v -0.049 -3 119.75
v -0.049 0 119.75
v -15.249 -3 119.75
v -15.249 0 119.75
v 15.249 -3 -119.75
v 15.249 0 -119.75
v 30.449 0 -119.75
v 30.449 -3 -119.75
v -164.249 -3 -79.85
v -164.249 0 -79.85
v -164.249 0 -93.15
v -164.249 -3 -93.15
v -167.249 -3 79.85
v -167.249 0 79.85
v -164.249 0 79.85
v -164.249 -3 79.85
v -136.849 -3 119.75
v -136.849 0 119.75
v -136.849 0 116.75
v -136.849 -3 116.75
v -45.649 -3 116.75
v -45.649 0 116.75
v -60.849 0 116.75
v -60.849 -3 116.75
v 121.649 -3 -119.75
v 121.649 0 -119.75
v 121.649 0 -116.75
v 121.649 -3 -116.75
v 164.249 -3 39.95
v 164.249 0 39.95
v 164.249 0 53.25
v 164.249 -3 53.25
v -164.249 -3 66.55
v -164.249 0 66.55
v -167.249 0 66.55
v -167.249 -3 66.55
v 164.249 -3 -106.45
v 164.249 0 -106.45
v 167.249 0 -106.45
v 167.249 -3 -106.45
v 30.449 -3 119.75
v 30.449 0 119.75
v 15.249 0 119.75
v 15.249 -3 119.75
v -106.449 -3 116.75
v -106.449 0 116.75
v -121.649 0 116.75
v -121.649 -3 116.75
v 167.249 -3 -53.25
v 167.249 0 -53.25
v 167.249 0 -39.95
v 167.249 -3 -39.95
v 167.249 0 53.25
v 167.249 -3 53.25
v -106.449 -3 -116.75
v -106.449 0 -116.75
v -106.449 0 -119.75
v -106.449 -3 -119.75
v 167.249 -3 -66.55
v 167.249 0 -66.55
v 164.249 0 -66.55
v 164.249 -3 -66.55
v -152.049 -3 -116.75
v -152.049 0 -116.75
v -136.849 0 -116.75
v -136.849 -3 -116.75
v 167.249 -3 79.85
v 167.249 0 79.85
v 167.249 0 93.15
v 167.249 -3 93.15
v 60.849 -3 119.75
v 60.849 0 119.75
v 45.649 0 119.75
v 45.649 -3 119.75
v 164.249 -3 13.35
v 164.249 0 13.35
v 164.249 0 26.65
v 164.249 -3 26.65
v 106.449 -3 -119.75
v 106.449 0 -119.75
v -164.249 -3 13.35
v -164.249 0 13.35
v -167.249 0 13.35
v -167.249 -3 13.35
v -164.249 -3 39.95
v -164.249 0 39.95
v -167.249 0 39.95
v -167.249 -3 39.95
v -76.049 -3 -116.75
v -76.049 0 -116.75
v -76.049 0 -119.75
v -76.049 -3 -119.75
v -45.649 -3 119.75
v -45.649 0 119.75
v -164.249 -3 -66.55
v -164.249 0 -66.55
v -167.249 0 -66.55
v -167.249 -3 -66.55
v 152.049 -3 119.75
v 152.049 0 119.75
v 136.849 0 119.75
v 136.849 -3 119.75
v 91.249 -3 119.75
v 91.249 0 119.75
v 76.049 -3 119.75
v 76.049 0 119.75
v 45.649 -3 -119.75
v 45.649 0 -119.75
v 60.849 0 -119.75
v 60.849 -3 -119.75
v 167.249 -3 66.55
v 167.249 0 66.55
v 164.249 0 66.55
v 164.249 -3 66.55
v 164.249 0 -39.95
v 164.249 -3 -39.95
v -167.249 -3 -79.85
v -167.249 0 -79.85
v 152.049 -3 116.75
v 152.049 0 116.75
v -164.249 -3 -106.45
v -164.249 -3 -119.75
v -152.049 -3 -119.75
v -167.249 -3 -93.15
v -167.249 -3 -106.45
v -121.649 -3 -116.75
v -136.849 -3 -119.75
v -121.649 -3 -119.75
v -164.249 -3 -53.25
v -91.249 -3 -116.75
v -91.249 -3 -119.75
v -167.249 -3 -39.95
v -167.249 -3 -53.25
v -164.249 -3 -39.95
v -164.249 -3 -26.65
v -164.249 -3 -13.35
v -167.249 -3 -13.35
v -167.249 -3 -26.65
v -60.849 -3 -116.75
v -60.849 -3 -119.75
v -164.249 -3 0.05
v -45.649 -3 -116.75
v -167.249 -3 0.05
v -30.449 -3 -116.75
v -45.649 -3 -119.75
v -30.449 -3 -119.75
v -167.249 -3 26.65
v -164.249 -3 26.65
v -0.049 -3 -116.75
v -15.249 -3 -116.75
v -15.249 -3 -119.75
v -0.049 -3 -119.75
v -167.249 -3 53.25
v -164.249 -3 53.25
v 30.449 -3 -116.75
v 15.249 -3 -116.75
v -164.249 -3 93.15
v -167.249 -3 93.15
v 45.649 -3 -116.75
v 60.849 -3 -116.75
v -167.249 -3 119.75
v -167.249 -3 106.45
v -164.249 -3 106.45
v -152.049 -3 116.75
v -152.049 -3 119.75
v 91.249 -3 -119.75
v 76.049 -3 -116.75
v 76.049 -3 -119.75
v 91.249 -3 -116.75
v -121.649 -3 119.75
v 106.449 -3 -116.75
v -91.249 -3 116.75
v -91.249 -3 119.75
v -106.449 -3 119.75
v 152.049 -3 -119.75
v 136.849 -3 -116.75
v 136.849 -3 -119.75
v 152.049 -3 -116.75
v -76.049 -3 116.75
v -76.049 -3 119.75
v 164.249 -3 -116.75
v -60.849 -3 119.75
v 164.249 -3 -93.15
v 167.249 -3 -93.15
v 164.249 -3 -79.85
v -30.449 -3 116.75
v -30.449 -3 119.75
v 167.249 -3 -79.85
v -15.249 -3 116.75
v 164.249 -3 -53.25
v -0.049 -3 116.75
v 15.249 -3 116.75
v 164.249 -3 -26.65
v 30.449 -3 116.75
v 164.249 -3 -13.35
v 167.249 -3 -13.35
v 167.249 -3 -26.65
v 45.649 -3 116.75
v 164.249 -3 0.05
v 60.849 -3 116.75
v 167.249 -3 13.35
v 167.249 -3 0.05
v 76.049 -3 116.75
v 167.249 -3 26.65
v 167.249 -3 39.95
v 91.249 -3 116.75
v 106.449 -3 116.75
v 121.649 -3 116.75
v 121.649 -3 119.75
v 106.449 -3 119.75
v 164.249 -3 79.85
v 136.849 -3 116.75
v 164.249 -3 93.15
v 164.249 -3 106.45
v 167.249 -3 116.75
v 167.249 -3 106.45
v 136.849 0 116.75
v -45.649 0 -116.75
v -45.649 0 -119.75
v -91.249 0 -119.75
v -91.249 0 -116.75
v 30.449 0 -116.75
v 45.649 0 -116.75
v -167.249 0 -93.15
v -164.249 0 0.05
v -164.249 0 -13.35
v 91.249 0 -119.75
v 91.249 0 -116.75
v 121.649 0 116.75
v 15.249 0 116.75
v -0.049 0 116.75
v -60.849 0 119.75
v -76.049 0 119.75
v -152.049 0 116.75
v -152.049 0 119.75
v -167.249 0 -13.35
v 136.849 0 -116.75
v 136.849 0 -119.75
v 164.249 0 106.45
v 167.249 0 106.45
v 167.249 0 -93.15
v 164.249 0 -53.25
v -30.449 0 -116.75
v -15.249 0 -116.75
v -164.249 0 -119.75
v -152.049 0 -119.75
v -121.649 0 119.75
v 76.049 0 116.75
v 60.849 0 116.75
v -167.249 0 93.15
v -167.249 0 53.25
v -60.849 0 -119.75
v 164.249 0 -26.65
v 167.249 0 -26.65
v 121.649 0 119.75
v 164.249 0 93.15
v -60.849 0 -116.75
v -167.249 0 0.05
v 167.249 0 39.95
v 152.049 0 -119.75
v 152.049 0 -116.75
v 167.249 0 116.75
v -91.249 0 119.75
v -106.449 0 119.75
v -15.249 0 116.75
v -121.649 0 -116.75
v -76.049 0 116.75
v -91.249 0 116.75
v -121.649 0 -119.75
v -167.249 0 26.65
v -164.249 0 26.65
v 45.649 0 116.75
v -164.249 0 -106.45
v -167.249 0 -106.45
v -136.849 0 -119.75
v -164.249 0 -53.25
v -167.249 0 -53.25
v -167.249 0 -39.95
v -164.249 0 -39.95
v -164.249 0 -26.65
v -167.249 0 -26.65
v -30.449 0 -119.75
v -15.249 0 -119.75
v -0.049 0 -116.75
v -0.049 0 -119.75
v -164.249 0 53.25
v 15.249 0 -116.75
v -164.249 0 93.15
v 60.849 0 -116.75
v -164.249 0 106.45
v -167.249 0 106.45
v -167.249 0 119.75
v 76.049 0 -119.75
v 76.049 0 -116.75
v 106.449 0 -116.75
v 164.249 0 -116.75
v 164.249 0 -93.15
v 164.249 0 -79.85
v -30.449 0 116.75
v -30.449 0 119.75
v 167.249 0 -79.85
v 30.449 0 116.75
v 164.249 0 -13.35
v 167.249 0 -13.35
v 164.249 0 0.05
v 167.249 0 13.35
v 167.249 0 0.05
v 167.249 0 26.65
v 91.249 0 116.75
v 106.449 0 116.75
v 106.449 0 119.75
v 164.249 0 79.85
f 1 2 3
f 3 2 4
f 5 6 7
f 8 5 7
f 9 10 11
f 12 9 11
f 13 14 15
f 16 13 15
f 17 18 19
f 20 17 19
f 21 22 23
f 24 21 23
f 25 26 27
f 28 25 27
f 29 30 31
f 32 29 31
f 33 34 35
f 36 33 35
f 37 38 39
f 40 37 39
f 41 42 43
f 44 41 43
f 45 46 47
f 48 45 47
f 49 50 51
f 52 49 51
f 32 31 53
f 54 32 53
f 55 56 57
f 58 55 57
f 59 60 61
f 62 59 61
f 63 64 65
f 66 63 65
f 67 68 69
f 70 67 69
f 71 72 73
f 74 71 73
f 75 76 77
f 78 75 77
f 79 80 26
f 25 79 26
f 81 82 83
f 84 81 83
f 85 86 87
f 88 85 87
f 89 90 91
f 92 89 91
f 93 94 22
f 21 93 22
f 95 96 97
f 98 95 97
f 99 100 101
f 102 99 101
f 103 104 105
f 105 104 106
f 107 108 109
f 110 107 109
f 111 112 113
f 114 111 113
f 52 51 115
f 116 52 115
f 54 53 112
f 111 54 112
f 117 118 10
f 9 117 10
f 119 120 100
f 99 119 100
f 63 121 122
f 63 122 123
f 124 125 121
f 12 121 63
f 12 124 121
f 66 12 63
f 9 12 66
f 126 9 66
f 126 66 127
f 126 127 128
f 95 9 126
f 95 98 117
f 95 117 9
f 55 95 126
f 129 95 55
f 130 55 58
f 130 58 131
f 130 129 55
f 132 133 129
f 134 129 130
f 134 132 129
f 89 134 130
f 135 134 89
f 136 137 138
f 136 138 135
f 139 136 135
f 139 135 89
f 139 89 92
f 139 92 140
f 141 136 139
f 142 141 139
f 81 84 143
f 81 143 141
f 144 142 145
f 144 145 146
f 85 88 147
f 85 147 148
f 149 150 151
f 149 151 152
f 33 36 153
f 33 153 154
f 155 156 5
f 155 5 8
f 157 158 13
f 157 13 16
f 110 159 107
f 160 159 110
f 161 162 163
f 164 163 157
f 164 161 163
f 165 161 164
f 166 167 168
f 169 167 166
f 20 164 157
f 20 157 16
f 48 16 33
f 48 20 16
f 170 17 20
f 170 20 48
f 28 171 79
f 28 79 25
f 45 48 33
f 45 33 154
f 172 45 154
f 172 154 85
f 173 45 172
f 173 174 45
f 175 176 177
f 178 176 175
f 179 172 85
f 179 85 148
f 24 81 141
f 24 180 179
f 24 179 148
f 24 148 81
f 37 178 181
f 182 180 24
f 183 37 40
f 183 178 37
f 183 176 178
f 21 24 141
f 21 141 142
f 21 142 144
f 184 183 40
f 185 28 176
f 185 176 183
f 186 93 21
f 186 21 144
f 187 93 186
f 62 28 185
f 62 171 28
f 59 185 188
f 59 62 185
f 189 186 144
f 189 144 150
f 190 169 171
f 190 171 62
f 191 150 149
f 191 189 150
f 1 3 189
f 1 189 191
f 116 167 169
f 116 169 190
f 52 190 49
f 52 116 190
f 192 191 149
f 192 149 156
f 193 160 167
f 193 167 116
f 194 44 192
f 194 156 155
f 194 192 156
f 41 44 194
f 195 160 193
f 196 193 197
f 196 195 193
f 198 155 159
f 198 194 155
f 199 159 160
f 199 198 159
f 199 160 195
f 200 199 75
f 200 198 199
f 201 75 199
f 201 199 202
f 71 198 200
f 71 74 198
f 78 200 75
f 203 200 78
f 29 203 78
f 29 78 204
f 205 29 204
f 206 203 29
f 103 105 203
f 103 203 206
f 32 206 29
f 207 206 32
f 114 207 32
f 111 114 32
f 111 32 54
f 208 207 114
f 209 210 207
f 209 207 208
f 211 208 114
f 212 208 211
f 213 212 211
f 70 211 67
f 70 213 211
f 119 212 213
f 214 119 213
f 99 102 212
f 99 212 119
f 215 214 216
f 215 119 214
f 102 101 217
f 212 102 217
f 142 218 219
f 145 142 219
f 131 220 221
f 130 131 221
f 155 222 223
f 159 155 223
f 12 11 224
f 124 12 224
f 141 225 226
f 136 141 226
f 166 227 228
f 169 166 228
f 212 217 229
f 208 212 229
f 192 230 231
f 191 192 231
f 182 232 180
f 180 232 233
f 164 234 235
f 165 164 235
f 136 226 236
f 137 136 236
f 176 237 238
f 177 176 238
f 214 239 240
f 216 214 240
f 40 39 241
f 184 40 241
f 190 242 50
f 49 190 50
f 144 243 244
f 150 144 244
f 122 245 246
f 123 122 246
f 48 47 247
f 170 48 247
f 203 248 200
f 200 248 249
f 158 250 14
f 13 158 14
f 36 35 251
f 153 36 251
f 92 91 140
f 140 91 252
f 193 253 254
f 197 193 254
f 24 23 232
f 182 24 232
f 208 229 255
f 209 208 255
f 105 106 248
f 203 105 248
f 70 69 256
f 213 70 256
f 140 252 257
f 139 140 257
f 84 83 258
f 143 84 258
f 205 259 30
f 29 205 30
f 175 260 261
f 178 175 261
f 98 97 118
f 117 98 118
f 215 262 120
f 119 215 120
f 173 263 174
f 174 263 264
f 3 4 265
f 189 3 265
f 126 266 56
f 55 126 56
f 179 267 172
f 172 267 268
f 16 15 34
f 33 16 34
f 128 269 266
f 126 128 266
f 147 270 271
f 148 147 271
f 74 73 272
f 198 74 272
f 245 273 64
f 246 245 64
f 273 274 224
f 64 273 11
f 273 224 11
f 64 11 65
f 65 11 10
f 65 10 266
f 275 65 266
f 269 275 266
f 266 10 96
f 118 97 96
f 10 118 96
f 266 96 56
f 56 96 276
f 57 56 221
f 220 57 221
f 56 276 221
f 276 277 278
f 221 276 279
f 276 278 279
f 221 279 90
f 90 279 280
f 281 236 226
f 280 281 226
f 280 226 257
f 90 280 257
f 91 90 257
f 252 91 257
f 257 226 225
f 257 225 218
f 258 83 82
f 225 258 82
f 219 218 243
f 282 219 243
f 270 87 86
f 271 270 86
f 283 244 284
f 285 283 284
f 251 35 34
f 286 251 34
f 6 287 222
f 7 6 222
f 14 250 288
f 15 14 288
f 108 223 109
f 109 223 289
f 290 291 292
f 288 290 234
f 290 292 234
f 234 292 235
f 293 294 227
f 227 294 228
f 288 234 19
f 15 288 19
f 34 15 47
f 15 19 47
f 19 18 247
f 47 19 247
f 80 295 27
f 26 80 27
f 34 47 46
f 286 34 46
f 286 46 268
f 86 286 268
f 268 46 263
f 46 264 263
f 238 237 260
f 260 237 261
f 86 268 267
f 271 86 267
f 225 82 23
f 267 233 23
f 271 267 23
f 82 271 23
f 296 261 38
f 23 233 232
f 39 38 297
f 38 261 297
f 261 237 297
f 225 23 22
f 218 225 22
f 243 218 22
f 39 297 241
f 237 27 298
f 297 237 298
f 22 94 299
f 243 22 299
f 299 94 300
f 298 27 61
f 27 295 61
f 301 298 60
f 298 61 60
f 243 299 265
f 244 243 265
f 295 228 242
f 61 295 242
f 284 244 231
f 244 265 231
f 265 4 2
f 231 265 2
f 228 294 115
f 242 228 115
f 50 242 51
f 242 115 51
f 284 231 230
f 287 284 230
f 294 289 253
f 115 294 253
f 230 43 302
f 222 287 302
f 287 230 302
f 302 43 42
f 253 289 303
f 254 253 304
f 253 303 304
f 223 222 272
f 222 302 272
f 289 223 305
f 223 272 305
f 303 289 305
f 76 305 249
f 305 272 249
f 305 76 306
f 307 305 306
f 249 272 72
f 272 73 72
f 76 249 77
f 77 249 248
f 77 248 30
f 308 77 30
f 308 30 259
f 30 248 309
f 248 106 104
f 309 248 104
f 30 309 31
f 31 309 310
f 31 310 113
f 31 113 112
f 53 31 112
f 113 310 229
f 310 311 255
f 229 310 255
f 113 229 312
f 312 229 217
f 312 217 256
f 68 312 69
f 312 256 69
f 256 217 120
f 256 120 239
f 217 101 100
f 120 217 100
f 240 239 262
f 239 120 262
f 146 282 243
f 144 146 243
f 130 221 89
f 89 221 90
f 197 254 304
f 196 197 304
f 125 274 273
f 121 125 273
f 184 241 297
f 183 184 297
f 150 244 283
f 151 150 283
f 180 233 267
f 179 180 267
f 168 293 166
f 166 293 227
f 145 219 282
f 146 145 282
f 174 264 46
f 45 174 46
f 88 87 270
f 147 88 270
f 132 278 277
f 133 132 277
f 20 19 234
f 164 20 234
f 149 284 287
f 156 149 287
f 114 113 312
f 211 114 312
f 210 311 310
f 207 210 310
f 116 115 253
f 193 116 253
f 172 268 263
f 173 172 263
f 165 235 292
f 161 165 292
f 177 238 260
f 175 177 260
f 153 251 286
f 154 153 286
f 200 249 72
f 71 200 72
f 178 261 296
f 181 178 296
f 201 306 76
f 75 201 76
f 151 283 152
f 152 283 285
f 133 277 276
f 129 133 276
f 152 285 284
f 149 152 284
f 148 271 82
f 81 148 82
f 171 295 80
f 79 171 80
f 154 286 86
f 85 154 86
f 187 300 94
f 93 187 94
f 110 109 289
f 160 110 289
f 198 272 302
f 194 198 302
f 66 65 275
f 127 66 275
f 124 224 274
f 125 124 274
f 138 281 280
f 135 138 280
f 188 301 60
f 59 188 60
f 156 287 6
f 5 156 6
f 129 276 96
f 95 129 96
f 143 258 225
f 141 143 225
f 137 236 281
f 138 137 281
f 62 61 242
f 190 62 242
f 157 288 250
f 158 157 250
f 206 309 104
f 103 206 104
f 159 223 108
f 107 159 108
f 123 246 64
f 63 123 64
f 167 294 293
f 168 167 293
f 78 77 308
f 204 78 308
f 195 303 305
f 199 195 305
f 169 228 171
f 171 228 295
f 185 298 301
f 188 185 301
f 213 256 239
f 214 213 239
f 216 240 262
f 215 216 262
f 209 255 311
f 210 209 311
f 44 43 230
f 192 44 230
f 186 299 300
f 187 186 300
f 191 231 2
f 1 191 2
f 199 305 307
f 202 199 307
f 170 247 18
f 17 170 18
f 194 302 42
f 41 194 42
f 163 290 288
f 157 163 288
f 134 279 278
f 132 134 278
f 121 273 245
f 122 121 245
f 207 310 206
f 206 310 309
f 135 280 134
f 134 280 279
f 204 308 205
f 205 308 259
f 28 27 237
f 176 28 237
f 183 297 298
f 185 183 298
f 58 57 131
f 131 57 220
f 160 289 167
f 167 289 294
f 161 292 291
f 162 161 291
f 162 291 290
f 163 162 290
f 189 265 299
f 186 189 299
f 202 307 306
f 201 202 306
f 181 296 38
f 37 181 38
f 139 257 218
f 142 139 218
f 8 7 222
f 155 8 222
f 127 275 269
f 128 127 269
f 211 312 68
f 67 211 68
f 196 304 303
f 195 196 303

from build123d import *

# Parameters (mm, degrees)
F1_DEPTH = 3


with BuildPart() as f1:
    # F0 (on Front) → F1 (new body)
    with BuildSketch(Plane.XZ):
        Polygon((152.04934, 116.75), (152.04934, 119.75), (136.84934, 119.75), (136.84934, 116.75), (121.64934, 116.75), (121.64934, 119.75), (106.44934, 119.75), (106.44934, 116.75), (91.24934, 116.75), (91.24934, 119.75), (76.04934, 119.75), (76.04934, 116.75), (60.84934, 116.75), (60.84934, 119.75), (45.64934, 119.75), (45.64934, 116.75), (30.44934, 116.75), (30.44934, 119.75), (15.24934, 119.75), (15.24934, 116.75), (0.04934, 116.75), (-0.04934, 116.75), (-0.04934, 119.75), (-15.24934, 119.75), (-15.24934, 116.75), (-30.44934, 116.75), (-30.44934, 119.75), (-45.64934, 119.75), (-45.64934, 116.75), (-60.84934, 116.75), (-60.84934, 119.75), (-76.04934, 119.75), (-76.04934, 116.75), (-91.24934, 116.75), (-91.24934, 119.75), (-106.44934, 119.75), (-106.44934, 116.75), (-121.64934, 116.75), (-121.64934, 119.75), (-136.84934, 119.75), (-136.84934, 116.75), (-152.04934, 116.75), (-152.04934, 119.75), (-167.24934, 119.75), (-167.24934, 106.45), (-164.24934, 106.45), (-164.24934, 93.15), (-167.24934, 93.15), (-167.24934, 79.85), (-164.24934, 79.85), (-164.24934, 66.55), (-167.24934, 66.55), (-167.24934, 53.25), (-164.24934, 53.25), (-164.24934, 39.95), (-167.24934, 39.95), (-167.24934, 26.65), (-164.24934, 26.65), (-164.24934, 13.35), (-167.24934, 13.35), (-167.24934, 0.05), (-164.24934, 0.05), (-164.24934, -0.05), (-164.24934, -13.35), (-167.24934, -13.35), (-167.24934, -26.65), (-164.24934, -26.65), (-164.24934, -39.95), (-167.24934, -39.95), (-167.24934, -53.25), (-164.24934, -53.25), (-164.24934, -66.55), (-167.24934, -66.55), (-167.24934, -79.85), (-164.24934, -79.85), (-164.24934, -93.15), (-167.24934, -93.15), (-167.24934, -106.45), (-164.24934, -106.45), (-164.24934, -119.75), (-152.04934, -119.75), (-152.04934, -116.75), (-136.84934, -116.75), (-136.84934, -119.75), (-121.64934, -119.75), (-121.64934, -116.75), (-106.44934, -116.75), (-106.44934, -119.75), (-91.24934, -119.75), (-91.24934, -116.75), (-76.04934, -116.75), (-76.04934, -119.75), (-60.84934, -119.75), (-60.84934, -116.75), (-45.64934, -116.75), (-45.64934, -119.75), (-30.44934, -119.75), (-30.44934, -116.75), (-15.24934, -116.75), (-15.24934, -119.75), (-0.04934, -119.75), (-0.04934, -116.75), (0.04934, -116.75), (15.24934, -116.75), (15.24934, -119.75), (30.44934, -119.75), (30.44934, -116.75), (45.64934, -116.75), (45.64934, -119.75), (60.84934, -119.75), (60.84934, -116.75), (76.04934, -116.75), (76.04934, -119.75), (91.24934, -119.75), (91.24934, -116.75), (106.44934, -116.75), (106.44934, -119.75), (121.64934, -119.75), (121.64934, -116.75), (136.84934, -116.75), (136.84934, -119.75), (152.04934, -119.75), (152.04934, -116.75), (164.24934, -116.75), (164.24934, -106.45), (167.24934, -106.45), (167.24934, -93.15), (164.24934, -93.15), (164.24934, -79.85), (167.24934, -79.85), (167.24934, -66.55), (164.24934, -66.55), (164.24934, -53.25), (167.24934, -53.25), (167.24934, -39.95), (164.24934, -39.95), (164.24934, -26.65), (167.24934, -26.65), (167.24934, -13.35), (164.24934, -13.35), (164.24934, -0.05), (164.24934, 0.05), (167.24934, 0.05), (167.24934, 13.35), (164.24934, 13.35), (164.24934, 26.65), (167.24934, 26.65), (167.24934, 39.95), (164.24934, 39.95), (164.24934, 53.25), (167.24934, 53.25), (167.24934, 66.55), (164.24934, 66.55), (164.24934, 79.85), (167.24934, 79.85), (167.24934, 93.15), (164.24934, 93.15), (164.24934, 106.45), (167.24934, 106.45), (167.24934, 116.75), align=None)
    extrude(amount=F1_DEPTH)


solid = f1.part
